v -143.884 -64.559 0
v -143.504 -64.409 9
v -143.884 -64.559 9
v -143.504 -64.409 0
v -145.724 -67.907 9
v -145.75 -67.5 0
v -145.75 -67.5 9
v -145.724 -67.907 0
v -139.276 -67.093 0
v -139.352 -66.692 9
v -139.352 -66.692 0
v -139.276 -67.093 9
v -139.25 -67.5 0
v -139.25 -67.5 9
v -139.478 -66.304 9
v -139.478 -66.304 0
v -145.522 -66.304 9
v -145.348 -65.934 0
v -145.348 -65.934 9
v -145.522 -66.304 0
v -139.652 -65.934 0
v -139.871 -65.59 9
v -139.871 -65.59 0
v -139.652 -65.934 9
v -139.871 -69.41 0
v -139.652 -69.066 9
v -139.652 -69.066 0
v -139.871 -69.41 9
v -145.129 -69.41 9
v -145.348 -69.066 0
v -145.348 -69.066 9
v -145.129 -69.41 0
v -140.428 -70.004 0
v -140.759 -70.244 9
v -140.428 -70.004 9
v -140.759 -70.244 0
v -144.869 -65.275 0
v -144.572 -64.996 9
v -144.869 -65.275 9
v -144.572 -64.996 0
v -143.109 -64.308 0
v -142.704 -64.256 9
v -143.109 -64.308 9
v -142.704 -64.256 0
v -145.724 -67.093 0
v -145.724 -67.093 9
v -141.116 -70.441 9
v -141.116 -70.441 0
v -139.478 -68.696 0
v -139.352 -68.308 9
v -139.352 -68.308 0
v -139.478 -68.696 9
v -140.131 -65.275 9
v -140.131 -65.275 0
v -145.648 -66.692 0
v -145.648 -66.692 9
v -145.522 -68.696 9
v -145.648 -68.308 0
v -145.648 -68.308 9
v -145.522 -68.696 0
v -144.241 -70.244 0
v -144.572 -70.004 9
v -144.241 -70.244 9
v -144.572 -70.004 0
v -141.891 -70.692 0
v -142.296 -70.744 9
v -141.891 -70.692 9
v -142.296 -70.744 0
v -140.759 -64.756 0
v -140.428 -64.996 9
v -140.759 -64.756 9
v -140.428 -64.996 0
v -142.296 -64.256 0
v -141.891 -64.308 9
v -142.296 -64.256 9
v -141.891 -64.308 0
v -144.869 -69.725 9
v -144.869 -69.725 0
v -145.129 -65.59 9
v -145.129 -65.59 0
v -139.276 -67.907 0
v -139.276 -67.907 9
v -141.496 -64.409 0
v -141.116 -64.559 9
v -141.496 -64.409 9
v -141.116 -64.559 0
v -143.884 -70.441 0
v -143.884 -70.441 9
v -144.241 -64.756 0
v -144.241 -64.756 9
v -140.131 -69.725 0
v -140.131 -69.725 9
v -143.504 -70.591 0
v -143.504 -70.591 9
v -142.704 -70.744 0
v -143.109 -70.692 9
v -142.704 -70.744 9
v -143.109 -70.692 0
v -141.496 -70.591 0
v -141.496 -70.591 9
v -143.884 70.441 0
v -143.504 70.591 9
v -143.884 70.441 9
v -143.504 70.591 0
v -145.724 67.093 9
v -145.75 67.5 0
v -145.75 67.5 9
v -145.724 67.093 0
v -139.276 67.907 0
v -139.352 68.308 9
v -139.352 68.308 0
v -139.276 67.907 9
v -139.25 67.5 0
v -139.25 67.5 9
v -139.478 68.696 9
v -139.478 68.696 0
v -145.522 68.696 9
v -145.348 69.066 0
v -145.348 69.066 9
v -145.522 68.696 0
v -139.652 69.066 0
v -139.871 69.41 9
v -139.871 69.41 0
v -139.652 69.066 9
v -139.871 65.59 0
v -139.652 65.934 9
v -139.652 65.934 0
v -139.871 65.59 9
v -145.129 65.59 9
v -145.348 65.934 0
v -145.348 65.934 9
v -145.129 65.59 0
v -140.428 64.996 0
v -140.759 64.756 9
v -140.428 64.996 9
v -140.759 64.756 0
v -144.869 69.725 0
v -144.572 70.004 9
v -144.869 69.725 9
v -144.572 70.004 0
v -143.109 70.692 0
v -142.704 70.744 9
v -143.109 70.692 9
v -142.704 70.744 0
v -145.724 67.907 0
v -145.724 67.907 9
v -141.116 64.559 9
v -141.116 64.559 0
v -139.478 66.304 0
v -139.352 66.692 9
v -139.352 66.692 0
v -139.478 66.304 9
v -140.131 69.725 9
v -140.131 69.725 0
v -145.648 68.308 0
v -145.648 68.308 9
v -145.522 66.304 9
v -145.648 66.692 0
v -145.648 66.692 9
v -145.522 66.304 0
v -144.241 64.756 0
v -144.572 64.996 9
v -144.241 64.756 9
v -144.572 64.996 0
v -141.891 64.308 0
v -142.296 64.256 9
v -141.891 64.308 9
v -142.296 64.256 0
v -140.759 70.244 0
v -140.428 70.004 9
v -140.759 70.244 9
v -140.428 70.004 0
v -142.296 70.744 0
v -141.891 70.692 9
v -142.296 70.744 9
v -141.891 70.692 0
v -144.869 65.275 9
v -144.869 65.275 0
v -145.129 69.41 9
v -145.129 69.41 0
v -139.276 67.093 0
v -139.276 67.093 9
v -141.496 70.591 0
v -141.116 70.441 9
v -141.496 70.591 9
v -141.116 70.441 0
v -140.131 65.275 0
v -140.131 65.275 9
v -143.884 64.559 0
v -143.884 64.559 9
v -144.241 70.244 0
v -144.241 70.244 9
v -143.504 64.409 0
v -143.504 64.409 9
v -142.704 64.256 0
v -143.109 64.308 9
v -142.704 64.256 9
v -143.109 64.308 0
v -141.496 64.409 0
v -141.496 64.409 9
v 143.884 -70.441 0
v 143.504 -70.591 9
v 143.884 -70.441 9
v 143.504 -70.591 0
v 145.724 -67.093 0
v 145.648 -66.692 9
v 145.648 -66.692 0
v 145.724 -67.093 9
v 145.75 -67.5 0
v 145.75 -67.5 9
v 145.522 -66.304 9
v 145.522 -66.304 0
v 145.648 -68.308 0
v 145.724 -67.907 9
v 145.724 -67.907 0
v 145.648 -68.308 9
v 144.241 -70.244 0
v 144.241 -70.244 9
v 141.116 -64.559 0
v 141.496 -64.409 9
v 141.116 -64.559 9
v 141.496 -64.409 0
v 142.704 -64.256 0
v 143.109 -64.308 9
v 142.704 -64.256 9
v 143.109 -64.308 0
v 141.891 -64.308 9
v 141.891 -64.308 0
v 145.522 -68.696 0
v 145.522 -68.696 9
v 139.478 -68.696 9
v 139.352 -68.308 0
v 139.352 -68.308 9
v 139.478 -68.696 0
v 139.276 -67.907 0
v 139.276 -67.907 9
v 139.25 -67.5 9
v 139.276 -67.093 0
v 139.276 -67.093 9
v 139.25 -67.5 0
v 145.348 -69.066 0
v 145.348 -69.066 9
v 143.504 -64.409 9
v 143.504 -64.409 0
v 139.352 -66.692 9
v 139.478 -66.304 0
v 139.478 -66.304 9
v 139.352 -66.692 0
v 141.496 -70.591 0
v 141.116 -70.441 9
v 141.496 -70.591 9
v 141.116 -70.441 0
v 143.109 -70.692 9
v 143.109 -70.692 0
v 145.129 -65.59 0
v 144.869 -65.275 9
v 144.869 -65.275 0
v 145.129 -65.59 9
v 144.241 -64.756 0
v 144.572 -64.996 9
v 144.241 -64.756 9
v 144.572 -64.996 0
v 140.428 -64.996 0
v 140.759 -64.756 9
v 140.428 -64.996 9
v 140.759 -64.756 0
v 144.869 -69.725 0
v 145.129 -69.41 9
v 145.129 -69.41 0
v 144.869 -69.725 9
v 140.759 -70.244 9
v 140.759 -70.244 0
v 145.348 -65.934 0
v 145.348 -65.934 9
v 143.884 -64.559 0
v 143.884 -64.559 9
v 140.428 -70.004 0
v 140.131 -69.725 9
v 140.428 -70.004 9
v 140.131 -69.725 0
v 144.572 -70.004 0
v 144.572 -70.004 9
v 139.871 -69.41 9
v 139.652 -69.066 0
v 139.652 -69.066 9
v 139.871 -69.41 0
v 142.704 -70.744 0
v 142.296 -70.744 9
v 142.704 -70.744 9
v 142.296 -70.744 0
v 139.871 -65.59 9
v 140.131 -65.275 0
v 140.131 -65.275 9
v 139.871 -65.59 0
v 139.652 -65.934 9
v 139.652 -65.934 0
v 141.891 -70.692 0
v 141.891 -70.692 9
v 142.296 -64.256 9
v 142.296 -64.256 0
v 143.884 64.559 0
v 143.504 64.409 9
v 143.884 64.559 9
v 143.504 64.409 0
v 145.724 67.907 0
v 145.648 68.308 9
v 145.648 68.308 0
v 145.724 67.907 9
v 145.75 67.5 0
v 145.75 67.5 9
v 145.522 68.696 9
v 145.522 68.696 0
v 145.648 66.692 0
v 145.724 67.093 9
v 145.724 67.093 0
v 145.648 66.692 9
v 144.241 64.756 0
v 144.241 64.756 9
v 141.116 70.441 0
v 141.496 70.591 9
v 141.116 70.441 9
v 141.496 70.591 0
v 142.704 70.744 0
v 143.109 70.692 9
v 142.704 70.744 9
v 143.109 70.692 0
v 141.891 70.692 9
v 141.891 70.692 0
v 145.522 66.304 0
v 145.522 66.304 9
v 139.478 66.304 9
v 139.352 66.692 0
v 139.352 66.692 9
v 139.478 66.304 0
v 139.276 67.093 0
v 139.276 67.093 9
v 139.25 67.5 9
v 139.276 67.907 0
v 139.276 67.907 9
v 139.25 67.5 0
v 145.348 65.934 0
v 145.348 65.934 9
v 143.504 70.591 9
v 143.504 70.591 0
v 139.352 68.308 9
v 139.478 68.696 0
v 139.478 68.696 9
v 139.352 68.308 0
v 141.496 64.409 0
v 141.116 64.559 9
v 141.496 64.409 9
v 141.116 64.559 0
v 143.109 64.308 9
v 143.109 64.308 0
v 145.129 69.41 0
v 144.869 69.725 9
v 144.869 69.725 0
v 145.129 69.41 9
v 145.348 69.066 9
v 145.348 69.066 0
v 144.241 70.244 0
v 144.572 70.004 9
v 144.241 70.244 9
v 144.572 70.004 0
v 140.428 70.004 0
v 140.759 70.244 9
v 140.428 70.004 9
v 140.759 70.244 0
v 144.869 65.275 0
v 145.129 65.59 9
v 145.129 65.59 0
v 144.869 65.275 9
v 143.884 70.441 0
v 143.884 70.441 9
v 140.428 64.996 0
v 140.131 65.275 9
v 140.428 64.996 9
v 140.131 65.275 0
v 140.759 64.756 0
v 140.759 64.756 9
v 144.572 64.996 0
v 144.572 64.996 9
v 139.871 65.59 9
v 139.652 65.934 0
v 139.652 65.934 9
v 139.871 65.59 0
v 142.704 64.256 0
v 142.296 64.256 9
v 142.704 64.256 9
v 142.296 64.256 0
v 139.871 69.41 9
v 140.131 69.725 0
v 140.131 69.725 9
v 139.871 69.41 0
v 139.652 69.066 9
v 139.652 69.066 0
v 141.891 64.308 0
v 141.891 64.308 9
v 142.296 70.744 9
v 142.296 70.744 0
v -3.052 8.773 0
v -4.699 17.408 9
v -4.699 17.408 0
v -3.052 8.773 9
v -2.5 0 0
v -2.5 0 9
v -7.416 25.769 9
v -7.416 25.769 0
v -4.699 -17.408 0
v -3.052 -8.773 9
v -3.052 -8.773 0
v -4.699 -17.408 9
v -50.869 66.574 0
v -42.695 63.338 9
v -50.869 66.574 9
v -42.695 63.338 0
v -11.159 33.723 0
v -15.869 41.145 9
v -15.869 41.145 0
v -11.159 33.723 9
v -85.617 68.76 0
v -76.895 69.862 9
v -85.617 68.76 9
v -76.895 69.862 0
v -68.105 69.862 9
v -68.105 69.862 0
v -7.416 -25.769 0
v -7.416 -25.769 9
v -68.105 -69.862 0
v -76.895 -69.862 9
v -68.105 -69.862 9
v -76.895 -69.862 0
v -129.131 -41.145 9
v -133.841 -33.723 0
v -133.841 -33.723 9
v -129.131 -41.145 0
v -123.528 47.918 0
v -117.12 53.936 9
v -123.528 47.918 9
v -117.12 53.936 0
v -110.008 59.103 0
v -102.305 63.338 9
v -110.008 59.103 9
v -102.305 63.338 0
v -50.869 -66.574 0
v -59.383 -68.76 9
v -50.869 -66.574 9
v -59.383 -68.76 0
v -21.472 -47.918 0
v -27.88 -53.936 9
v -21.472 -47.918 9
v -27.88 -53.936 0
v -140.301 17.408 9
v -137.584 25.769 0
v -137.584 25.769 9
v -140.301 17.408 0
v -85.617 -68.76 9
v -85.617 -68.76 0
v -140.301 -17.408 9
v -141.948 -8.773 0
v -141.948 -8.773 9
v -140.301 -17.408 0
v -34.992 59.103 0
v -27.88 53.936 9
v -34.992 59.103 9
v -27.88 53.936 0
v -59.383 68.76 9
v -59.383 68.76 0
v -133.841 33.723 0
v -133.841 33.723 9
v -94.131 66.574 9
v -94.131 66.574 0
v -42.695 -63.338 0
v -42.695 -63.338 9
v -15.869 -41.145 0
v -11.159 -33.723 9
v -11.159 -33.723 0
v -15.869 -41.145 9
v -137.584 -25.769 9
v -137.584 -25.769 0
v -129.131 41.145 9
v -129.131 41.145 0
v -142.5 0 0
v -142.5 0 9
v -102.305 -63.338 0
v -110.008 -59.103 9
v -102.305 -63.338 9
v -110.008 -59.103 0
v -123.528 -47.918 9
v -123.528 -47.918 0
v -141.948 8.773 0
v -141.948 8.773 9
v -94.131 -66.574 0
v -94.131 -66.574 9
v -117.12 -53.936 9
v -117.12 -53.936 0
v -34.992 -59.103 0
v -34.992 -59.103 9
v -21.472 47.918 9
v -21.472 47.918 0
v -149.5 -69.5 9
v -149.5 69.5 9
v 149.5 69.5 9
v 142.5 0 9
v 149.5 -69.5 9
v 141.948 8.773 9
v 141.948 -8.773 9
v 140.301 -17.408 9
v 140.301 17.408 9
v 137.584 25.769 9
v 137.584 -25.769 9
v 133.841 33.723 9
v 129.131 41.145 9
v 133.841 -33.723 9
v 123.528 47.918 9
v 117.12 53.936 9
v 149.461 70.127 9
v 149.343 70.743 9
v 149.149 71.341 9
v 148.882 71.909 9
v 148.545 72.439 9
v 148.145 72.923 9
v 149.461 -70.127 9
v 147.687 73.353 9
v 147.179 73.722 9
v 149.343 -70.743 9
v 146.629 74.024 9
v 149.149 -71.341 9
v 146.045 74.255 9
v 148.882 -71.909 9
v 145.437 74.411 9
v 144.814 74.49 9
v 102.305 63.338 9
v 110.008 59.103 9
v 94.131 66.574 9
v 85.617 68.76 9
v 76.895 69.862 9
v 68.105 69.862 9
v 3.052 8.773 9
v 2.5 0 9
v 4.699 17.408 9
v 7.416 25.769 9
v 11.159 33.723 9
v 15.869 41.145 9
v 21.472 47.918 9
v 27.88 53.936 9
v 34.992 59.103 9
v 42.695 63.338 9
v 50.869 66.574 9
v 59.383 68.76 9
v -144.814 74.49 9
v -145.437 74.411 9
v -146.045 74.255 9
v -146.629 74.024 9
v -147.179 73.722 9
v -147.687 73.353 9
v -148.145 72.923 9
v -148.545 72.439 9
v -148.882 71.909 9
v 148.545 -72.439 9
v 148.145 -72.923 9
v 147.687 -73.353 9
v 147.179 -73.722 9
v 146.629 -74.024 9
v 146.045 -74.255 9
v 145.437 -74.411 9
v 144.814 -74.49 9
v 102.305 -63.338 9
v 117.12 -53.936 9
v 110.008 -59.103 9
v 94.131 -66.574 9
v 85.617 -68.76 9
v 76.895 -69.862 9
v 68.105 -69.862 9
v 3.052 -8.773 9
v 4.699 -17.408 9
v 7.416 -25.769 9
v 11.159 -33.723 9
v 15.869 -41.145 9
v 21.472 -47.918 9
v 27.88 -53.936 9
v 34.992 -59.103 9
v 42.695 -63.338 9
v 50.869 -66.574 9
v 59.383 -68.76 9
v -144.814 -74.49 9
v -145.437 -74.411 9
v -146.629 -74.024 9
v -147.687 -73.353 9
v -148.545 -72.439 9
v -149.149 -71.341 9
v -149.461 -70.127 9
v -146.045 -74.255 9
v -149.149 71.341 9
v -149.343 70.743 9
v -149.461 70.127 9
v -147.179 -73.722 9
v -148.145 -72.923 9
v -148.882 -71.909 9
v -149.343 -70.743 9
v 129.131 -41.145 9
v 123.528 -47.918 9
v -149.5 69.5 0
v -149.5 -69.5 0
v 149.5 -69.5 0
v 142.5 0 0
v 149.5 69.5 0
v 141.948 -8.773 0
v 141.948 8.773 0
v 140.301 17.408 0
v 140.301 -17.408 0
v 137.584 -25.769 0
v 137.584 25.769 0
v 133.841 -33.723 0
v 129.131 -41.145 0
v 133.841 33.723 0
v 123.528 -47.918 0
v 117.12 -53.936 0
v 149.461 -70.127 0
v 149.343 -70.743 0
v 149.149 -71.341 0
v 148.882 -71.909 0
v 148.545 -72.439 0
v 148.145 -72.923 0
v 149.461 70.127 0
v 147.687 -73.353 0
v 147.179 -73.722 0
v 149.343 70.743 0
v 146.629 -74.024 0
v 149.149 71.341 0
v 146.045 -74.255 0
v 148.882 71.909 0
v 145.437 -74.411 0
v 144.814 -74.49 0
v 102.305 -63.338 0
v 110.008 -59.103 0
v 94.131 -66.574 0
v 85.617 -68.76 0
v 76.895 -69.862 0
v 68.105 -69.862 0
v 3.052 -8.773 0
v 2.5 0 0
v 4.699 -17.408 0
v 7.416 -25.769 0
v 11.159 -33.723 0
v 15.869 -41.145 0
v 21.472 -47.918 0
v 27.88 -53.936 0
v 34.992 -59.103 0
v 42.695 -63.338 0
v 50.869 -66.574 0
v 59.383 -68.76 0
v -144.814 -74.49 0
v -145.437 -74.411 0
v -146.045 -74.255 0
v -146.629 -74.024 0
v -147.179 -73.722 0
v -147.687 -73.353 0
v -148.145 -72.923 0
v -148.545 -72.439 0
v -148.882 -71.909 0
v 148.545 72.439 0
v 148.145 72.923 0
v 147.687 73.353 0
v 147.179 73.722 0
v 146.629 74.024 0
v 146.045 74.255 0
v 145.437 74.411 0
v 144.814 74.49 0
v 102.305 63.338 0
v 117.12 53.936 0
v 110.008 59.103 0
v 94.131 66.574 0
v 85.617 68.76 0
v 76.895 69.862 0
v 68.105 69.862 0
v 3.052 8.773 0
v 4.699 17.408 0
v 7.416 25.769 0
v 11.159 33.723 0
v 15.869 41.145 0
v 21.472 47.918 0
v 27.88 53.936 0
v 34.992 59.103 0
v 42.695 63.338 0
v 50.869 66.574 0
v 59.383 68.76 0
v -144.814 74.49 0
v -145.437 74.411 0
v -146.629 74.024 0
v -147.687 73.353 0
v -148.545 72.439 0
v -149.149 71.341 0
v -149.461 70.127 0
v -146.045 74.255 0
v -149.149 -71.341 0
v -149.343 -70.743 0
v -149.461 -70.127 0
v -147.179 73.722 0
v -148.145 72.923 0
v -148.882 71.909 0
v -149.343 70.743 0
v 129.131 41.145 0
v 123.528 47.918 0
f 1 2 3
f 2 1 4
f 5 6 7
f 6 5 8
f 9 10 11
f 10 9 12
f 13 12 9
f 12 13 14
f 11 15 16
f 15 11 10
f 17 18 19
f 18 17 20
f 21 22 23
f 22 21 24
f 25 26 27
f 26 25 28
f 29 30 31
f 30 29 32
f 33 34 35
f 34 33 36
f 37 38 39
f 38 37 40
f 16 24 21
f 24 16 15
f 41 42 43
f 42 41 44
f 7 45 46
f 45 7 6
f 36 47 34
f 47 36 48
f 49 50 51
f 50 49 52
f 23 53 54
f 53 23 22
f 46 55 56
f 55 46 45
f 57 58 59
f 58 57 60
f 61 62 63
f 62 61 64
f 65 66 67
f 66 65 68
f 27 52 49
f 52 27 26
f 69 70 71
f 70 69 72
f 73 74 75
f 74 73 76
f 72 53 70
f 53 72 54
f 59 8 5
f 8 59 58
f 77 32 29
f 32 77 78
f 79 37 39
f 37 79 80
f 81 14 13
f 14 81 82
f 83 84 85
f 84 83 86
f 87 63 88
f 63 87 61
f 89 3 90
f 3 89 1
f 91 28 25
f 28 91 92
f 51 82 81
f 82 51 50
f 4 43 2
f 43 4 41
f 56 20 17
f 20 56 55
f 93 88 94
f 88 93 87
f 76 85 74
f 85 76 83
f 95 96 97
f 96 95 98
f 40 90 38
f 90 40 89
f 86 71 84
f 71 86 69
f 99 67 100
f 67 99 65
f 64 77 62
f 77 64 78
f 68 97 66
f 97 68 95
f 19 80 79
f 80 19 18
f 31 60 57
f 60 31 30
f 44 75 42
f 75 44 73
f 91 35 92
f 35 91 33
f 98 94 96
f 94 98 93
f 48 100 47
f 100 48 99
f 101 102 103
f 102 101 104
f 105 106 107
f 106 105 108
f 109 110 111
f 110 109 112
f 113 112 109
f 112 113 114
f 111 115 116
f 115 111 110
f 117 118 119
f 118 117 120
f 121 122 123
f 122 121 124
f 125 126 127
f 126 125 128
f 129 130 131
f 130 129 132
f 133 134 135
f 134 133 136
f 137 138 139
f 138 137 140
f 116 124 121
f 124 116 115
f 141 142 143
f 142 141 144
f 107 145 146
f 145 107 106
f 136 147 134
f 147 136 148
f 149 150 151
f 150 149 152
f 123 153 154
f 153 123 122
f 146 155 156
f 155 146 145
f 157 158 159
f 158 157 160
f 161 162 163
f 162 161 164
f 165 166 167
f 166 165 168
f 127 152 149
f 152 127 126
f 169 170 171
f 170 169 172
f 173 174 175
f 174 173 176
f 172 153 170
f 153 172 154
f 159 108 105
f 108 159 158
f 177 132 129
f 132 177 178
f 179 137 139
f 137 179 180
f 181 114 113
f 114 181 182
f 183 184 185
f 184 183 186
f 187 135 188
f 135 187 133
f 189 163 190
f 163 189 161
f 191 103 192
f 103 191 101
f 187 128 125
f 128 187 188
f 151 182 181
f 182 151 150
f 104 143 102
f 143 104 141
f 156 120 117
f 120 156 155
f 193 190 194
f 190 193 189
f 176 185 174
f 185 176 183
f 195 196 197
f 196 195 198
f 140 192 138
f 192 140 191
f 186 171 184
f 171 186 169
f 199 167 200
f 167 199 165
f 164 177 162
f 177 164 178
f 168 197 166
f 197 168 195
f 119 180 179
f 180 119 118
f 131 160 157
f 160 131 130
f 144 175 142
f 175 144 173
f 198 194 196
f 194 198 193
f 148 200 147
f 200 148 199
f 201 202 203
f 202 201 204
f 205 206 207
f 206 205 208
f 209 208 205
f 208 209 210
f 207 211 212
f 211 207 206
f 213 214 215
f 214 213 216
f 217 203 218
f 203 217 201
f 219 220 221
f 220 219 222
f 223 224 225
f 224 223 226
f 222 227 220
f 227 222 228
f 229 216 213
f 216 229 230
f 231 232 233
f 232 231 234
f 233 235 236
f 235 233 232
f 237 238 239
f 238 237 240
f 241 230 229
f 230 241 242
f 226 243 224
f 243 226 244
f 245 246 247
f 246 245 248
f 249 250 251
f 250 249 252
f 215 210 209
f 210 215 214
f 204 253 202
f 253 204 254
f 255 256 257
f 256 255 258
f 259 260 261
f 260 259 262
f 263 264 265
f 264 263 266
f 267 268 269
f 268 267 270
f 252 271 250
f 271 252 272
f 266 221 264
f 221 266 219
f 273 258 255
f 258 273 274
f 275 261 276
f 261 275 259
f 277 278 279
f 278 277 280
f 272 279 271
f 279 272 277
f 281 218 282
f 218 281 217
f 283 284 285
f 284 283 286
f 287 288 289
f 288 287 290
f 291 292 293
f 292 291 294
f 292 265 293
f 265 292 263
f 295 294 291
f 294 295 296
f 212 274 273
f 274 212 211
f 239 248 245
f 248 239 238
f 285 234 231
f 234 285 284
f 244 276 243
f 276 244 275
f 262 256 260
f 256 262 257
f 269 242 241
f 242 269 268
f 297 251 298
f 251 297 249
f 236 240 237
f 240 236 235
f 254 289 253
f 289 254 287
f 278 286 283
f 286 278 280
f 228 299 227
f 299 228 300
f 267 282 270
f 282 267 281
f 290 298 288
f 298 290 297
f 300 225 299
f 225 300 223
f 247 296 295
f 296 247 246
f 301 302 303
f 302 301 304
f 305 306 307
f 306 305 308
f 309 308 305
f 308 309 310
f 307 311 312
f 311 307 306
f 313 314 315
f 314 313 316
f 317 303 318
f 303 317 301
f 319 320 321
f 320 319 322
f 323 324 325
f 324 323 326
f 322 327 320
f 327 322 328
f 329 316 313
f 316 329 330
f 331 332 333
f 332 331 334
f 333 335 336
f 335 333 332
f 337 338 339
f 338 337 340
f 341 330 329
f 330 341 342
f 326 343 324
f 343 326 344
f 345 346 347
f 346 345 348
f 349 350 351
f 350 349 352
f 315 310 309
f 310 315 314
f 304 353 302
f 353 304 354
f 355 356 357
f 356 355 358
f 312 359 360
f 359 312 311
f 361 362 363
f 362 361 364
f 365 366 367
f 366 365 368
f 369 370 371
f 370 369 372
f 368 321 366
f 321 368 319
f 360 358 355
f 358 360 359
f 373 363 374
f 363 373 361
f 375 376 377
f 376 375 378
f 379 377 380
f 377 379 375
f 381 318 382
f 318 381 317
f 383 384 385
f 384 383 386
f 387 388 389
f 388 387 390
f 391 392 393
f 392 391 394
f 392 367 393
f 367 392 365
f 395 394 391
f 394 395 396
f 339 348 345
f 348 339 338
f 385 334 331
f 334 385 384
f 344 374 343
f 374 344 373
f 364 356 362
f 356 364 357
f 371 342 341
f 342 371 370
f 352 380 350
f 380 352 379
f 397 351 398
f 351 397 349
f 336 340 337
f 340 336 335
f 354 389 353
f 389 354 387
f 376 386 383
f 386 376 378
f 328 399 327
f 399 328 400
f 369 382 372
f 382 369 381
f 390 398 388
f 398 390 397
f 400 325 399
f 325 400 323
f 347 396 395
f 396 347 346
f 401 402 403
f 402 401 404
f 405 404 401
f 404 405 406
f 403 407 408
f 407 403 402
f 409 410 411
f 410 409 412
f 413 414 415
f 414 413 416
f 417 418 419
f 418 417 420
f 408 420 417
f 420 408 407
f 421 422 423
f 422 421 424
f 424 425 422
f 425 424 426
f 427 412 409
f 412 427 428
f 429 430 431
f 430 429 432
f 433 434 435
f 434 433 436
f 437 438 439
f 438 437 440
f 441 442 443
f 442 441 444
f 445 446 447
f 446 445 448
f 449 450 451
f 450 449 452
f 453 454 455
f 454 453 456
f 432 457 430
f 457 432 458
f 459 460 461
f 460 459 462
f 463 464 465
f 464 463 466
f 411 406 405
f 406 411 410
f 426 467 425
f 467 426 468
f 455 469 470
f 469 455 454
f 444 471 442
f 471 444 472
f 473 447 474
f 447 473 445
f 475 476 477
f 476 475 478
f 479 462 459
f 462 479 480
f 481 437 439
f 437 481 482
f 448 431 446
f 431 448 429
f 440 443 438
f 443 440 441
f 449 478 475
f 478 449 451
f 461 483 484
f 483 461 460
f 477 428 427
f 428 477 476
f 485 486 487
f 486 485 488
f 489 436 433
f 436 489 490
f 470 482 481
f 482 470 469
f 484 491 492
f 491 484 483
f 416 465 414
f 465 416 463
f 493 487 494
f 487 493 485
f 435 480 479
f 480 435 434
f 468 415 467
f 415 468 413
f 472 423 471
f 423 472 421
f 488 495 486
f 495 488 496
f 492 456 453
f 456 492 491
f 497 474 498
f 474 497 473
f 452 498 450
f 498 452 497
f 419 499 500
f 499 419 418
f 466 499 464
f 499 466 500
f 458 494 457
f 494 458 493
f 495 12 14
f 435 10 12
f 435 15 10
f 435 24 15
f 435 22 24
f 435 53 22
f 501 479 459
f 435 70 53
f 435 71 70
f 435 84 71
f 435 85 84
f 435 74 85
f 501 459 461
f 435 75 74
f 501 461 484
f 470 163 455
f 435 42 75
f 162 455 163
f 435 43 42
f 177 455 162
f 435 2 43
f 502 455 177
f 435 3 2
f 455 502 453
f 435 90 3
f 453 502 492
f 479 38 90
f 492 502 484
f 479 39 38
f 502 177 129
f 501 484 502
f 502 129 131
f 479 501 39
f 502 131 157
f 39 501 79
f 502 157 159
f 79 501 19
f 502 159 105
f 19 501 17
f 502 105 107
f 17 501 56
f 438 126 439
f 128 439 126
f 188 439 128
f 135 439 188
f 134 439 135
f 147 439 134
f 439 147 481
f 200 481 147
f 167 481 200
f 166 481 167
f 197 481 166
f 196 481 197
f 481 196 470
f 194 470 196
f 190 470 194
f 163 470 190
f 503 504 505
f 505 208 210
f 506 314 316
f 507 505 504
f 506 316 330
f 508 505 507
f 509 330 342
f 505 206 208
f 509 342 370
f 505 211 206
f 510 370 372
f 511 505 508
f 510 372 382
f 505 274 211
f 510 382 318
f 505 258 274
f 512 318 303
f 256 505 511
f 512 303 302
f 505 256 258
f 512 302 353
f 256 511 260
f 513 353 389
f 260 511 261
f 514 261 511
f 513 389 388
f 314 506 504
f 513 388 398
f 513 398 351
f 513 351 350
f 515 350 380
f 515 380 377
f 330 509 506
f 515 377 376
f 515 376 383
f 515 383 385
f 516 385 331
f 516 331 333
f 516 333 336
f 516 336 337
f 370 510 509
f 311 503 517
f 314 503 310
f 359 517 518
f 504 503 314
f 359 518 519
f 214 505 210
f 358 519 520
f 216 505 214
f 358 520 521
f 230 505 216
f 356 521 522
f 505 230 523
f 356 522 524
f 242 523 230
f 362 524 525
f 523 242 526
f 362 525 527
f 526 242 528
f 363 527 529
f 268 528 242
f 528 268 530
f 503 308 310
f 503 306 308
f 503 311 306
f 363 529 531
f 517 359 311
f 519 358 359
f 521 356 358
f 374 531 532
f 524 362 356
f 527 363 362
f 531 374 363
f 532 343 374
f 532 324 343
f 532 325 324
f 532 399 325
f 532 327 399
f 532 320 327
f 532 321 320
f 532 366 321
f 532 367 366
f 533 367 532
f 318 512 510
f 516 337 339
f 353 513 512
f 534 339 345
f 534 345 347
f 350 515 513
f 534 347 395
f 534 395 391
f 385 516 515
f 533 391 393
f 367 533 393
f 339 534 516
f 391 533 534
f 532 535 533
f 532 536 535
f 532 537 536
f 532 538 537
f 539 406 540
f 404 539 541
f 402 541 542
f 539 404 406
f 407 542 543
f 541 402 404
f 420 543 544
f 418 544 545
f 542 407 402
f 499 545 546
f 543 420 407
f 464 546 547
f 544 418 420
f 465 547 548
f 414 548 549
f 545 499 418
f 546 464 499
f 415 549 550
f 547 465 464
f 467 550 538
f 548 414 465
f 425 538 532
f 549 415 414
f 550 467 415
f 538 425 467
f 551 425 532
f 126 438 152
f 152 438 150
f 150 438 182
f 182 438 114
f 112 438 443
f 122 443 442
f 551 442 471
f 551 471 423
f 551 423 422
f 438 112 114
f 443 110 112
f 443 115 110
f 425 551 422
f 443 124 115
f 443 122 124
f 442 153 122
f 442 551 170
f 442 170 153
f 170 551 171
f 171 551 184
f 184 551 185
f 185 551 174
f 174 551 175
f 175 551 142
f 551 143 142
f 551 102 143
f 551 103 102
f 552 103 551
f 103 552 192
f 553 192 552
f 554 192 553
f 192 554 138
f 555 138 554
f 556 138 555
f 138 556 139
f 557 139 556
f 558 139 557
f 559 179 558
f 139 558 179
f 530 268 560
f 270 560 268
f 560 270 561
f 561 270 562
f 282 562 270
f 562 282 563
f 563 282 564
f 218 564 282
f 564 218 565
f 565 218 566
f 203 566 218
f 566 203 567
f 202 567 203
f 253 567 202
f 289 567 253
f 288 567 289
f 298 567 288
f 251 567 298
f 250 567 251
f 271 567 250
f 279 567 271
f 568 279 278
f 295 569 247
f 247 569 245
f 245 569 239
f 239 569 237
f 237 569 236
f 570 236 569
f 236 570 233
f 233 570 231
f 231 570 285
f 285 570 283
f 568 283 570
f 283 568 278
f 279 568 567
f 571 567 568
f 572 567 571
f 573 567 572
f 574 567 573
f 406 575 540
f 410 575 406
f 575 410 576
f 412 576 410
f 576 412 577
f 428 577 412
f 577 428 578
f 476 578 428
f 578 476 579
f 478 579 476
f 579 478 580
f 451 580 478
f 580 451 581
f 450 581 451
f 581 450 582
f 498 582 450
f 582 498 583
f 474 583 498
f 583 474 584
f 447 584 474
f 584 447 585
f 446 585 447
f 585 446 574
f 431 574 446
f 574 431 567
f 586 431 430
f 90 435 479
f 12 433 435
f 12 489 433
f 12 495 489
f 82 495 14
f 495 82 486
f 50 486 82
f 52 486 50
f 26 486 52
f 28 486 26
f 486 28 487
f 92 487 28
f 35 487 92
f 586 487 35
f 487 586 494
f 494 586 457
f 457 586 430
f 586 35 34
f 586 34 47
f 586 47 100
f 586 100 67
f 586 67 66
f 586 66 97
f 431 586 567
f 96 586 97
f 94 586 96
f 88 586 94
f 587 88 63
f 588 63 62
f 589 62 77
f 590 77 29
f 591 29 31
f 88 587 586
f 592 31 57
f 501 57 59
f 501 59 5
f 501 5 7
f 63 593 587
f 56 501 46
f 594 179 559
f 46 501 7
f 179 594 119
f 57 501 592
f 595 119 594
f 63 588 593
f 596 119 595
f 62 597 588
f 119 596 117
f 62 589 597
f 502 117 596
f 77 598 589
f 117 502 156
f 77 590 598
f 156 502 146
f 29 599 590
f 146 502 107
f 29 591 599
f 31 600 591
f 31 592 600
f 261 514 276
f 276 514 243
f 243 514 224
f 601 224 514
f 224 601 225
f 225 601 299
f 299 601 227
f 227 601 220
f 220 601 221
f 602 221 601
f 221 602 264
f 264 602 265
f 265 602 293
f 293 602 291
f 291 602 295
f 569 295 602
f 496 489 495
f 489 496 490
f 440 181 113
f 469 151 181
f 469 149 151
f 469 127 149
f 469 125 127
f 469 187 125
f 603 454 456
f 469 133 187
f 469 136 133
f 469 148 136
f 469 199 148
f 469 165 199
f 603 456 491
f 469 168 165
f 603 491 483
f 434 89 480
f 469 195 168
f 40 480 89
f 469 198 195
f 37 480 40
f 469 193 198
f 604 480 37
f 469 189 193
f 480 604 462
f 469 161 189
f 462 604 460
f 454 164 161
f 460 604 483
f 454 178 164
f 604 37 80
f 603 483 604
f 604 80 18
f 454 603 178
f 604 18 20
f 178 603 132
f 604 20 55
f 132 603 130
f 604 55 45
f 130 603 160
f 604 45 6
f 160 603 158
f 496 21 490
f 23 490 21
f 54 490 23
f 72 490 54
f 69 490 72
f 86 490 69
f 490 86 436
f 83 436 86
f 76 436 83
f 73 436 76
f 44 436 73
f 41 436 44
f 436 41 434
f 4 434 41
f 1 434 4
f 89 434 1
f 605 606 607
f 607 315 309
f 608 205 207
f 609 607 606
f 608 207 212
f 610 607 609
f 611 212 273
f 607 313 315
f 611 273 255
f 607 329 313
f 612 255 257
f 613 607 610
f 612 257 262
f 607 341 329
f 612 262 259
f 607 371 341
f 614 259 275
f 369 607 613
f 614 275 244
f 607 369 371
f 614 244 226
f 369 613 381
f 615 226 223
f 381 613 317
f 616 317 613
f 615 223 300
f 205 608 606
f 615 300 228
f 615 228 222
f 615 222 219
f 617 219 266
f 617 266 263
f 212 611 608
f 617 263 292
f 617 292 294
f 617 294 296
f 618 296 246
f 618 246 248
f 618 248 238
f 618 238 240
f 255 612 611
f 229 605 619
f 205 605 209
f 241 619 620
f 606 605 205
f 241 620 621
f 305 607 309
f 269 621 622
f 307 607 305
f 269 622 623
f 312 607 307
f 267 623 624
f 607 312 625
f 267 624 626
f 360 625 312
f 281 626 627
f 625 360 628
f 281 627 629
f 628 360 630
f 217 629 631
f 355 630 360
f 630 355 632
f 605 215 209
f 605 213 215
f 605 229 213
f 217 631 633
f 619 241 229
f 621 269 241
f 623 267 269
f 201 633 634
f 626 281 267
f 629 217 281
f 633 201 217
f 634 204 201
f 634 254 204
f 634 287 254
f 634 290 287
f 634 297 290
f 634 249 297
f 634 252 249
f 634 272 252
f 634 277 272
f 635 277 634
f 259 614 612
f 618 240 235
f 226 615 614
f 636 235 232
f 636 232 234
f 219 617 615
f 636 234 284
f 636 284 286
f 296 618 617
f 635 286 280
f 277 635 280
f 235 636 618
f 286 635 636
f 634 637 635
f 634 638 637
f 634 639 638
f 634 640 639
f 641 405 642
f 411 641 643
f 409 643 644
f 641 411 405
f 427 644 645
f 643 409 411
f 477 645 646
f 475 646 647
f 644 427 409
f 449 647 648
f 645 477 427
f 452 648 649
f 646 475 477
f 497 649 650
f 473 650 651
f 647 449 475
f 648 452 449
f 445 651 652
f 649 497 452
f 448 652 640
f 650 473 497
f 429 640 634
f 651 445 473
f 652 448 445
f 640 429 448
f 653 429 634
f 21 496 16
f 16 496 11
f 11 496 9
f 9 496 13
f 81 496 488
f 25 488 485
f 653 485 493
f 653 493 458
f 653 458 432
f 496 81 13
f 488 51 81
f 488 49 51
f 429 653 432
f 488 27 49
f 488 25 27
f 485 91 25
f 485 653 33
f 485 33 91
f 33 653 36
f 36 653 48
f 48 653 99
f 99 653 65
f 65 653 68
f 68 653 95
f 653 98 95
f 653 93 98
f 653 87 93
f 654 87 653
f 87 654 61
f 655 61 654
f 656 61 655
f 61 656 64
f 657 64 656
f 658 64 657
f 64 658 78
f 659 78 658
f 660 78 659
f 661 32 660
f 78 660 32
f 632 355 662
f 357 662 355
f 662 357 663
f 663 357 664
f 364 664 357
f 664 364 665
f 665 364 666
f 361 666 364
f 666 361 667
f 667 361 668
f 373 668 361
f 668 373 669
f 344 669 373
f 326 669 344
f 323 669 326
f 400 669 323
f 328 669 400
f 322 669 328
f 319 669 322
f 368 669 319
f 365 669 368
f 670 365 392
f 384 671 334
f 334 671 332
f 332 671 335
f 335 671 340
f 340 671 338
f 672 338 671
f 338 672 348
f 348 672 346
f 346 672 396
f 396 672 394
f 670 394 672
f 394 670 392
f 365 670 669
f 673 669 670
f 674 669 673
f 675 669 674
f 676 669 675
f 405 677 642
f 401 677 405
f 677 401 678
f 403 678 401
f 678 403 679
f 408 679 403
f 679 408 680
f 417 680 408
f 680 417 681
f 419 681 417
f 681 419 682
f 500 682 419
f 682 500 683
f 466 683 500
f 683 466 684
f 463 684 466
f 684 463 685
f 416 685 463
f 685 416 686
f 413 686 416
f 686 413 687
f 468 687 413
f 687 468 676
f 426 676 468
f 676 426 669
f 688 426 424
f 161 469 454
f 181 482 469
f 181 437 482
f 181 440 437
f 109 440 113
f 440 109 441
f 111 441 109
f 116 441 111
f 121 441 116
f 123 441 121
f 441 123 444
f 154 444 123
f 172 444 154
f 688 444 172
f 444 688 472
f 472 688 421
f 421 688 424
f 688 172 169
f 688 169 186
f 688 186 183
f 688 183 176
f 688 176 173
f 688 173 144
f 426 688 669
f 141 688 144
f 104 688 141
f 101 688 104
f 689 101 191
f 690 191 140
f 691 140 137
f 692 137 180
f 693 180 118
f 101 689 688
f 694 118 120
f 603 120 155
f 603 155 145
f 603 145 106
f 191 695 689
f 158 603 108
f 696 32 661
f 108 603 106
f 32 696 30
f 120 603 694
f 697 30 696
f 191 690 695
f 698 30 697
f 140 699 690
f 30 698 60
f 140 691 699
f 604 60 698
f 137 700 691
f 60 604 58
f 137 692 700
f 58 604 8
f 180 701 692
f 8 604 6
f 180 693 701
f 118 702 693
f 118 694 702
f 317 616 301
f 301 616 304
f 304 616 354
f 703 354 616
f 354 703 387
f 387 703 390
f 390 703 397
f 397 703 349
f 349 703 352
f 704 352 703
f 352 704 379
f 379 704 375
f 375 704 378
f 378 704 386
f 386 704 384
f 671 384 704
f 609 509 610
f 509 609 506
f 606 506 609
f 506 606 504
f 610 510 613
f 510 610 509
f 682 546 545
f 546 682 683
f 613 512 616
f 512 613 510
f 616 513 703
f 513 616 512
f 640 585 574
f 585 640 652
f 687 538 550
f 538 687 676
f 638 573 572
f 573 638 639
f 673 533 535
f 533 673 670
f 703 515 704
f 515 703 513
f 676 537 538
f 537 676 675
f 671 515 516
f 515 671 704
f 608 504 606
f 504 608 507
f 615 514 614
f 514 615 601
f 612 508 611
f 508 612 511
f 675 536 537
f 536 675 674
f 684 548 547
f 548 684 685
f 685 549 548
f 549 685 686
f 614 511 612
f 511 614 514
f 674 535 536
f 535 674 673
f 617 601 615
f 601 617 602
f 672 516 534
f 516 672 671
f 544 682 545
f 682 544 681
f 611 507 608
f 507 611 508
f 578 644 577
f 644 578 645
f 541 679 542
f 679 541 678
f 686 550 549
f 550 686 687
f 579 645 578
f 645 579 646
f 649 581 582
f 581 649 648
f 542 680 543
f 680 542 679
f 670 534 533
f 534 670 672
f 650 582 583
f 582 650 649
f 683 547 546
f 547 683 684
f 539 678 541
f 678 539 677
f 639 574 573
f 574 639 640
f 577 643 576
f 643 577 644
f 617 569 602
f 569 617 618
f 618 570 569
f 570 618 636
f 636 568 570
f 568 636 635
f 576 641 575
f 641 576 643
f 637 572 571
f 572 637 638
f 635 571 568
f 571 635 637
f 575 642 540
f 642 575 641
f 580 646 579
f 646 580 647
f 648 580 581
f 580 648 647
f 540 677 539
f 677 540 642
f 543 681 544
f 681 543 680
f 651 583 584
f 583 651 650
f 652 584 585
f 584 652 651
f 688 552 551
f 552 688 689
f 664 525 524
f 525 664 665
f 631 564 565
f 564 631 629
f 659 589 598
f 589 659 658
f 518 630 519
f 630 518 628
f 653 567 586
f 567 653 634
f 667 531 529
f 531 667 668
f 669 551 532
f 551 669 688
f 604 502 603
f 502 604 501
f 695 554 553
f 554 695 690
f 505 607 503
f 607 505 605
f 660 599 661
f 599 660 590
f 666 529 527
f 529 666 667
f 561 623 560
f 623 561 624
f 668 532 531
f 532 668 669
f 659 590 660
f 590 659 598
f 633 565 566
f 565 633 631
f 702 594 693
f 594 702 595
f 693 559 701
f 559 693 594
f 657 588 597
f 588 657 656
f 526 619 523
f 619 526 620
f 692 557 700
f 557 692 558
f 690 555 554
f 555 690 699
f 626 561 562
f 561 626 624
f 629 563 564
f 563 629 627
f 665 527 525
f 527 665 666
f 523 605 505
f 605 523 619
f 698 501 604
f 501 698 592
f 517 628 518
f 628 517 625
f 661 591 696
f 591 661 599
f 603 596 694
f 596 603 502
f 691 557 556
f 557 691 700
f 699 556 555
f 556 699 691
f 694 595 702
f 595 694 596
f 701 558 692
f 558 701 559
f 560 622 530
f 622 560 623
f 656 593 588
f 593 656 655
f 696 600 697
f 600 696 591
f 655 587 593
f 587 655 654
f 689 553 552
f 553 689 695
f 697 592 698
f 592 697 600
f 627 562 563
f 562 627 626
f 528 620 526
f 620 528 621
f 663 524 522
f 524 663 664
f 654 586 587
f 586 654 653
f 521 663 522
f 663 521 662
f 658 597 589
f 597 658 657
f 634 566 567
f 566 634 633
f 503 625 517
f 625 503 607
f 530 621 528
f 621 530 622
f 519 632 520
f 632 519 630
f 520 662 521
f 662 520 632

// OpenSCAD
$fn = 50;

difference() {
	union() {
		hull() {
			translate(v = [-144.5, 69.5, 0]) {
				cylinder(h = 9, r = 5);
			}
			translate(v = [144.5, 69.5, 0]) {
				cylinder(h = 9, r = 5);
			}
			translate(v = [-144.5, -69.5, 0]) {
				cylinder(h = 9, r = 5);
			}
			translate(v = [144.5, -69.5, 0]) {
				cylinder(h = 9, r = 5);
			}
		}
	}
	union() {
		translate(v = [-142.5, -67.5, -100.0]) {
			cylinder(h = 200, r = 3.25);
		}
		translate(v = [-142.5, 67.5, -100.0]) {
			cylinder(h = 200, r = 3.25);
		}
		translate(v = [142.5, -67.5, -100.0]) {
			cylinder(h = 200, r = 3.25);
		}
		translate(v = [142.5, 67.5, -100.0]) {
			cylinder(h = 200, r = 3.25);
		}
		translate(v = [-142.5, -67.5, -100.0]) {
			cylinder(h = 200, r = 1.8);
		}
		translate(v = [-142.5, 67.5, -100.0]) {
			cylinder(h = 200, r = 1.8);
		}
		translate(v = [142.5, -67.5, -100.0]) {
			cylinder(h = 200, r = 1.8);
		}
		translate(v = [142.5, 67.5, -100.0]) {
			cylinder(h = 200, r = 1.8);
		}
		translate(v = [-72.5, 0, 0.0]) {
			cylinder(h = 9, r = 70.0);
		}
		translate(v = [72.5, 0, 0.0]) {
			cylinder(h = 9, r = 70.0);
		}
	}
}
